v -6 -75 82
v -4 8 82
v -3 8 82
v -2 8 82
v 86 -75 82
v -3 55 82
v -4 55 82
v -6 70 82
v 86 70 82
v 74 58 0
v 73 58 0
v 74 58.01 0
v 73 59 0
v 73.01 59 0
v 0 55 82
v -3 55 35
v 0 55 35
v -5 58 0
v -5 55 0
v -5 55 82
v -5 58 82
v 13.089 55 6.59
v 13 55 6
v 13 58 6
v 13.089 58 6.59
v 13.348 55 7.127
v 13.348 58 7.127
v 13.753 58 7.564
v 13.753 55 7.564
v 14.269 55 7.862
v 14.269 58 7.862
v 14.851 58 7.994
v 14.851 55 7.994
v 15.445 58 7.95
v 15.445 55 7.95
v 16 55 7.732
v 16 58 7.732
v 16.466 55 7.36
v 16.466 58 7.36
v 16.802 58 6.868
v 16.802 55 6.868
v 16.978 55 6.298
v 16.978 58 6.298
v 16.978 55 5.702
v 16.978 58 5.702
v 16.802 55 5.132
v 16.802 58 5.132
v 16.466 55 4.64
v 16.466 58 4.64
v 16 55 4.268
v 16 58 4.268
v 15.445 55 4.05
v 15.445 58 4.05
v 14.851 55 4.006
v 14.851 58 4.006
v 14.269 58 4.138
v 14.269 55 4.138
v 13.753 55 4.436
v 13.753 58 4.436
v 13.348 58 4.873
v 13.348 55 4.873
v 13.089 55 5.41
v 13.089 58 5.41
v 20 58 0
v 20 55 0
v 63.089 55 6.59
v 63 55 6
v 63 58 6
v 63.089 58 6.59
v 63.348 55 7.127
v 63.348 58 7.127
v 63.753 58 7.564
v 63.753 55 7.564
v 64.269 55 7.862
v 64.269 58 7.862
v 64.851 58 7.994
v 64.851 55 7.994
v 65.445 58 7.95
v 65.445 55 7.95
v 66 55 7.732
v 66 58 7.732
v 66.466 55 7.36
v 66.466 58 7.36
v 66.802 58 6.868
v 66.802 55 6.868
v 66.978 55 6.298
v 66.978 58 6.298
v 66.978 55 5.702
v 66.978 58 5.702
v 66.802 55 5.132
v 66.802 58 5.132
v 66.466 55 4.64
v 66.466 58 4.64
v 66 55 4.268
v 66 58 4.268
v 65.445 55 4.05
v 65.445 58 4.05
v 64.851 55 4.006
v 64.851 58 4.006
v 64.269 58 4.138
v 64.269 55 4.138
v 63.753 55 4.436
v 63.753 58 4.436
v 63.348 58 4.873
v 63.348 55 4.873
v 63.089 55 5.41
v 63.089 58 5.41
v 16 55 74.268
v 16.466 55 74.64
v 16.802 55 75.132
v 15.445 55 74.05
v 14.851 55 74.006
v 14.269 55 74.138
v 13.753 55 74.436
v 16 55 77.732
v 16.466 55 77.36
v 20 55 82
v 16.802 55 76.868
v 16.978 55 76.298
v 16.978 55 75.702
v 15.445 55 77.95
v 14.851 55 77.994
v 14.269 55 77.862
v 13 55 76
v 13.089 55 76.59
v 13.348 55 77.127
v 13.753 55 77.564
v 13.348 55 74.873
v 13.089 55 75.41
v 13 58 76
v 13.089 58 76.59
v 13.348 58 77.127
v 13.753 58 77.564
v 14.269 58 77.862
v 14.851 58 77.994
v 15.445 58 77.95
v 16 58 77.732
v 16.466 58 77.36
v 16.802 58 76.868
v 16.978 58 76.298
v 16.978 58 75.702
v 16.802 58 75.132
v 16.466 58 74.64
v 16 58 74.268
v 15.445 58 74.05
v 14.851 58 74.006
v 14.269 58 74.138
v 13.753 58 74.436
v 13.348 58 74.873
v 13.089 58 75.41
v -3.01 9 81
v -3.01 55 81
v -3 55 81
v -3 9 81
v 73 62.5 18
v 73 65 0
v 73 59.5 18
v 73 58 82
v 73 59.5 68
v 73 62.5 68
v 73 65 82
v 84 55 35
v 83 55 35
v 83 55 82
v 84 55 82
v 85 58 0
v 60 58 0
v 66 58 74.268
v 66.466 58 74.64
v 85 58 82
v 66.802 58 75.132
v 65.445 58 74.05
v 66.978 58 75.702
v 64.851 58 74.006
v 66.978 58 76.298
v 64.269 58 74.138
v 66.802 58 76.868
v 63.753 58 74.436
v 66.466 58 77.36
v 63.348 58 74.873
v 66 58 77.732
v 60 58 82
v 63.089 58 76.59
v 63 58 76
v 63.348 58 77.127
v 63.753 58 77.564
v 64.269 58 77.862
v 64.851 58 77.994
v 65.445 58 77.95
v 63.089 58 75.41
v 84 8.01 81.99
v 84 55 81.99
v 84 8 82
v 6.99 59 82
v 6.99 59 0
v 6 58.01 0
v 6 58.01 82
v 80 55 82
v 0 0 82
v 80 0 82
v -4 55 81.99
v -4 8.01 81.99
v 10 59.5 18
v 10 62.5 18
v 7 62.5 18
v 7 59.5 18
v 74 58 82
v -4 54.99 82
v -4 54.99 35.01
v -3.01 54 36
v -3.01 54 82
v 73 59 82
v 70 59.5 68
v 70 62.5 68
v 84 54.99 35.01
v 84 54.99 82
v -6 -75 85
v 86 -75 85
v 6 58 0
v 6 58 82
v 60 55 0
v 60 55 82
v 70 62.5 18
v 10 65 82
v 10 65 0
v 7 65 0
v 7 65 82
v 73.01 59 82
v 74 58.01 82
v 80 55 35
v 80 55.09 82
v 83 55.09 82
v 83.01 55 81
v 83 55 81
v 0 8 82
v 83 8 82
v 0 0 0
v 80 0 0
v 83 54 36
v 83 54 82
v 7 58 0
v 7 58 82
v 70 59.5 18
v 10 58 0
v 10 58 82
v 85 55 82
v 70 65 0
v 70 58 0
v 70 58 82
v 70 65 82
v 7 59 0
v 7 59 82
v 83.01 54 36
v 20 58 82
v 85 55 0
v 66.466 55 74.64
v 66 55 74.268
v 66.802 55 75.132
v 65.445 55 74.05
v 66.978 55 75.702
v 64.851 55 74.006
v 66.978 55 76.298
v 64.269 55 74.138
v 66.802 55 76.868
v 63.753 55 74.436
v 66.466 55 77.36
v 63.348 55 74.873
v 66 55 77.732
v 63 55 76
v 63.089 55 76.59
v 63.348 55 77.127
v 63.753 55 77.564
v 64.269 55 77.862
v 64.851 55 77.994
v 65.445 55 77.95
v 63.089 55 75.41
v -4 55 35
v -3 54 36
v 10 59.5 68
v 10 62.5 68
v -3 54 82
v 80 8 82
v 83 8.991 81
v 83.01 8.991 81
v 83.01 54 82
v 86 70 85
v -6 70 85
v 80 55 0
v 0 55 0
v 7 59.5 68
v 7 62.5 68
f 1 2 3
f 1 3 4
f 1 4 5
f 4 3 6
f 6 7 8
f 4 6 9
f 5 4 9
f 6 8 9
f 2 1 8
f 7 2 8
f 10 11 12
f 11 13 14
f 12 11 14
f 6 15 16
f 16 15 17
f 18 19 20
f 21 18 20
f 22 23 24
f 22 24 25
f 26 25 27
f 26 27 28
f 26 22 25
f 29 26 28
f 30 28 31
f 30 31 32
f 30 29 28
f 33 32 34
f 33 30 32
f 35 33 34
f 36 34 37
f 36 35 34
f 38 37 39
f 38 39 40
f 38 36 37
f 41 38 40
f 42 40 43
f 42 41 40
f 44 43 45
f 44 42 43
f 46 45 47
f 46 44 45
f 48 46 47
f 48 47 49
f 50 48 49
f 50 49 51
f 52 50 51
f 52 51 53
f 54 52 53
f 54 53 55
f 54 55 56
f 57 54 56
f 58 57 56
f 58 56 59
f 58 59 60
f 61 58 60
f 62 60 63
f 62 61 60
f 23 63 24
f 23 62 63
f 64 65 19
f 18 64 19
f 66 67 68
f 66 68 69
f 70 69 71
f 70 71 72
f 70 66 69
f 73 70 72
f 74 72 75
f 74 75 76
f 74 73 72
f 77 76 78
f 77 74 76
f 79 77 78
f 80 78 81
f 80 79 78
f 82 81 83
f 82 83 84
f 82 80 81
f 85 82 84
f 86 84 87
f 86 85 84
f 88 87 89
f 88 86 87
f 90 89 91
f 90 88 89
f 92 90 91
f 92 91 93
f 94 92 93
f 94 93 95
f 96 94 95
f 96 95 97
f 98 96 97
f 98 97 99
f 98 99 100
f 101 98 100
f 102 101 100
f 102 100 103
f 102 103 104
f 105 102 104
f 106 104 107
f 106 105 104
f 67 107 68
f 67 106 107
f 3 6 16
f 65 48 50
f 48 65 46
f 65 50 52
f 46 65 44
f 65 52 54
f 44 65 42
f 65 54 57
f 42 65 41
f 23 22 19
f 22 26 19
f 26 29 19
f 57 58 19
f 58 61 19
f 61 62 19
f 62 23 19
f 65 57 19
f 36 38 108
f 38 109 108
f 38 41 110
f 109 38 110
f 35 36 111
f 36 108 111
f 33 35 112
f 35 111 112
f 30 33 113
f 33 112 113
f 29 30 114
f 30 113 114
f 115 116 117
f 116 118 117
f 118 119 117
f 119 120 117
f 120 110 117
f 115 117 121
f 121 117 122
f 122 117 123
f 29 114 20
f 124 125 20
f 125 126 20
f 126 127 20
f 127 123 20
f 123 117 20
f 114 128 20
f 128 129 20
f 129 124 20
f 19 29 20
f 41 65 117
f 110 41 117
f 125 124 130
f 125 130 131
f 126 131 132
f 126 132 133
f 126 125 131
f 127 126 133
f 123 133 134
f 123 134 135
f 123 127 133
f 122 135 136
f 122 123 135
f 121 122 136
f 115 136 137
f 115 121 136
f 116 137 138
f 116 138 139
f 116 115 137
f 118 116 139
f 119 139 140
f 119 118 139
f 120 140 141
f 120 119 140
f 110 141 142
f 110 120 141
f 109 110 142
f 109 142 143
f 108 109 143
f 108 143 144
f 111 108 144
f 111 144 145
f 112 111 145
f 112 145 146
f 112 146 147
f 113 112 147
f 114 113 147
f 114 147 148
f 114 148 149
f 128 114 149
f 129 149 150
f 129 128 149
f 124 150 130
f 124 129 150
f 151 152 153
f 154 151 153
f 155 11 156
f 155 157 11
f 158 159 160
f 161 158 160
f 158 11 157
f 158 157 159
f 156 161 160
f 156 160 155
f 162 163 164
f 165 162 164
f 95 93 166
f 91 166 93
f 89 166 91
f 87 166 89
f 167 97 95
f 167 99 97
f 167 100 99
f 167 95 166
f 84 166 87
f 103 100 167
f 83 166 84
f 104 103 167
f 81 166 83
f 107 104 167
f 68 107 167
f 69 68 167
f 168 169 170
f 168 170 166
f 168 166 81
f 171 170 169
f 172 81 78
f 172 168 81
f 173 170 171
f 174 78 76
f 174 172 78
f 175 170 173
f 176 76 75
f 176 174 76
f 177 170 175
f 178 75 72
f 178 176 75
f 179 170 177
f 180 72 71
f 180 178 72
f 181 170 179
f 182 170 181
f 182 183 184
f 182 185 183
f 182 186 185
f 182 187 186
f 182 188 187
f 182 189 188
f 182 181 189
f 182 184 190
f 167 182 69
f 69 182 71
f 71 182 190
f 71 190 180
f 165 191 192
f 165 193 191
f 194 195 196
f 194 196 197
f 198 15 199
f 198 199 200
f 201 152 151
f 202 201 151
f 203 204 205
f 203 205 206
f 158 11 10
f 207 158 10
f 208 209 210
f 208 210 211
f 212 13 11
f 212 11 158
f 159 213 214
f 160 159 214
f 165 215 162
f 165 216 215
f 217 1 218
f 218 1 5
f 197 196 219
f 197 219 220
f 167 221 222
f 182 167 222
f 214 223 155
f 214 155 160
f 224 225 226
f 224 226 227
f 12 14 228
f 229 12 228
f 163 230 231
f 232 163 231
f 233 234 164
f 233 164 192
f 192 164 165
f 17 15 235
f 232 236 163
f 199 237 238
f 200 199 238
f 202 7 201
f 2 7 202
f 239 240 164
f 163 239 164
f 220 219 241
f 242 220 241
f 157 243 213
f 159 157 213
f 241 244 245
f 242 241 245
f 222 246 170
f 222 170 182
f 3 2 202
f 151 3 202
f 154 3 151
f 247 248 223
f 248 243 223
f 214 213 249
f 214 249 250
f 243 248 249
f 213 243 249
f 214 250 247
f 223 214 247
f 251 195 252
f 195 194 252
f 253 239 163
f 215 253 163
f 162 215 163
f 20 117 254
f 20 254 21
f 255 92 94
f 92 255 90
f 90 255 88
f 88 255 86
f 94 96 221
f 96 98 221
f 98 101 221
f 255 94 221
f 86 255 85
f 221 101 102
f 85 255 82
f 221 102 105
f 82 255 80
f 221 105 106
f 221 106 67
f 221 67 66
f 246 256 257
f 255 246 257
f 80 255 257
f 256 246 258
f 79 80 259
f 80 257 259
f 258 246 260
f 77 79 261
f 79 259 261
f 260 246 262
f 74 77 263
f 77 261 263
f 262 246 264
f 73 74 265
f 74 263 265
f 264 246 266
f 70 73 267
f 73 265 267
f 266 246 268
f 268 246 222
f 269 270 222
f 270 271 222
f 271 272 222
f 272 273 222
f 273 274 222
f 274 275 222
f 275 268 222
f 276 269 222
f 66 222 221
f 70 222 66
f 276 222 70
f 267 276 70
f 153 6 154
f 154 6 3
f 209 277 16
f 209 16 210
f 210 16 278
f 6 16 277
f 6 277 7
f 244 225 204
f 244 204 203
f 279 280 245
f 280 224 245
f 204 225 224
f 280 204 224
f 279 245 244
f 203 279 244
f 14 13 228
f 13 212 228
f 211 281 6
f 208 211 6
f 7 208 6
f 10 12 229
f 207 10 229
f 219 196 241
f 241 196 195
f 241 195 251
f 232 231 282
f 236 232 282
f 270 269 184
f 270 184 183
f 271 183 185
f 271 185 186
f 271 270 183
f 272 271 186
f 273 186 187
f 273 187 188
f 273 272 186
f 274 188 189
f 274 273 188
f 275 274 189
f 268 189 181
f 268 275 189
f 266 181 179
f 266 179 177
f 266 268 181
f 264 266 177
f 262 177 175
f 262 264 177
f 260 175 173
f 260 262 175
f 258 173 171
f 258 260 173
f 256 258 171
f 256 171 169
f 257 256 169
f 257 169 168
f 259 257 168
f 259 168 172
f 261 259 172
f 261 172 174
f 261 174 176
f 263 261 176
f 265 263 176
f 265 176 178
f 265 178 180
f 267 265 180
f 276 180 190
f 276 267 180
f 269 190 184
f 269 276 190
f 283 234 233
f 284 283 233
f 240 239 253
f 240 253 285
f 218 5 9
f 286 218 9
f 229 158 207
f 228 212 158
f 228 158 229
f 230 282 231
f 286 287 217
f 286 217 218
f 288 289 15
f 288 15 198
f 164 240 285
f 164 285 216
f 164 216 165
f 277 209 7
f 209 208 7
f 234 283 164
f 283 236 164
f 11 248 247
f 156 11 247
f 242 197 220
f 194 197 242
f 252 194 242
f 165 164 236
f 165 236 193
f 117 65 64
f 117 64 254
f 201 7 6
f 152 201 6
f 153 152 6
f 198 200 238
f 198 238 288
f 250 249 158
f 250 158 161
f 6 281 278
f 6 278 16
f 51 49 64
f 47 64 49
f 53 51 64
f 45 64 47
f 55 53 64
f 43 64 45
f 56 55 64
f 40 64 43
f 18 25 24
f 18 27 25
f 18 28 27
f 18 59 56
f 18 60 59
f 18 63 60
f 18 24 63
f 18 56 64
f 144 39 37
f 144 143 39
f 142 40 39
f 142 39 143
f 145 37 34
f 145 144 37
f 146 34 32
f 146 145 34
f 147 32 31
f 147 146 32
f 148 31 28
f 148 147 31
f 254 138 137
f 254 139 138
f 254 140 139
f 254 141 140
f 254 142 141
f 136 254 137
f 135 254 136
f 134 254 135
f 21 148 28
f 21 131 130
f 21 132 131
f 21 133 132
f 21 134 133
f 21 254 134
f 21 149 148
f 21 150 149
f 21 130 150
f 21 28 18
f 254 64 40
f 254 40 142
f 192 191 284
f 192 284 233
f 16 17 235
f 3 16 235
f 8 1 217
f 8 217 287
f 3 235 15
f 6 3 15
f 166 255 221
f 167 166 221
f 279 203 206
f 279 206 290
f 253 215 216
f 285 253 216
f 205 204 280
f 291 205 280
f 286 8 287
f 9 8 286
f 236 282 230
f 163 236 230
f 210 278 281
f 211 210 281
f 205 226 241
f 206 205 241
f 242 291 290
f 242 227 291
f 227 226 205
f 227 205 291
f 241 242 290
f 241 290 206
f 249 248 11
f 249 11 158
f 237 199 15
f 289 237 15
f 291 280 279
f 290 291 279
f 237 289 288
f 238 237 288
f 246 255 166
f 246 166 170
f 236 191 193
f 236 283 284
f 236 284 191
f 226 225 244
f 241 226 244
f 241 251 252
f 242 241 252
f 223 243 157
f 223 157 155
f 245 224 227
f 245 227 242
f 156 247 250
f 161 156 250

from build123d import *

# Parameters (mm, degrees)
SKETCH001_W     = 25
SKETCH001_H     = 82
SKETCH001_R     = 2
PAD_DEPTH       = 3
SKETCH003_W     = 7
SKETCH003_H     = 82
SKETCH003_W_2   = 3
SKETCH003_H_2   = 50
PAD006_DEPTH    = 3
SKETCH004_W     = 7
SKETCH004_H     = 82
SKETCH004_W_2   = 3
SKETCH004_H_2   = 50
PAD008_DEPTH    = 3
PAD009_DEPTH    = 3
PAD010_DEPTH    = 3
BOX_W           = 80
BOX_H           = 55
BOX_DEPTH       = 82
SKETCH006_W     = 1
SKETCH006_H     = 82
PAD011_DEPTH    = 1
CHAMFER_SIZE    = 0.99
CHAMFER001_SIZE = 0.99
PAD018_DEPTH    = 2
SKETCH007_W     = 1
SKETCH007_H     = 47
PAD012_DEPTH    = 1
CHAMFER003_SIZE = 0.99
PAD019_DEPTH    = 2
SKETCH008_W     = 1
SKETCH008_H     = 47
PAD013_DEPTH    = 1
CHAMFER002_SIZE = 0.99
PAD016_DEPTH    = 2
SKETCH002_W     = 92
SKETCH002_H     = 145
PAD007_DEPTH    = 3
SKETCH009_W     = 1
SKETCH009_H     = 47
PAD014_DEPTH    = 1
CHAMFER004_SIZE = 0.99
PAD017_DEPTH    = 2
SKETCH010_W     = 1
SKETCH010_H     = 47
PAD015_DEPTH    = 1
CHAMFER005_SIZE = 0.99


with BuildPart() as pad:
    # Sketch001 → Pad (new body)
    with BuildSketch(Plane(origin=(0, 55, 0), x_dir=(-1, 0, 0), z_dir=(0, 1, 0))):
        with Locations((-7.5, 41)):
            Rectangle(SKETCH001_W, SKETCH001_H)
        with Locations((-15, 76)):
            Circle(SKETCH001_R, mode=Mode.SUBTRACT)
        with Locations((-15, 6)):
            Circle(SKETCH001_R, mode=Mode.SUBTRACT)
        with Locations((-72.5, 41)):
            Rectangle(SKETCH001_W, SKETCH001_H)
        with Locations((-65.000015, 76)):
            Circle(SKETCH001_R, mode=Mode.SUBTRACT)
        with Locations((-65, 6)):
            Circle(SKETCH001_R, mode=Mode.SUBTRACT)
    extrude(amount=PAD_DEPTH)


with BuildPart() as pad006:
    # Sketch003 → Pad006 (new body)
    with BuildSketch(Plane(origin=(10, 0, 0), x_dir=(0, -1, 0), z_dir=(-1, 0, 0))):
        with Locations((-61.5, 41)):
            Rectangle(SKETCH003_W, SKETCH003_H)
        with Locations((-61, 43)):
            Rectangle(SKETCH003_W_2, SKETCH003_H_2, mode=Mode.SUBTRACT)
    extrude(amount=PAD006_DEPTH)


with BuildPart() as pad008:
    # Sketch004 → Pad008 (new body)
    with BuildSketch(Plane.YZ.offset(70)):
        with Locations((61.5, 41)):
            Rectangle(SKETCH004_W, SKETCH004_H)
        with Locations((61, 43)):
            Rectangle(SKETCH004_W_2, SKETCH004_H_2, mode=Mode.SUBTRACT)
    extrude(amount=PAD008_DEPTH)


with BuildPart() as pad009:
    # Sketch005 → Pad009 (new body)
    with BuildSketch(Plane.YZ.offset(80)):
        Polygon((8, 82), (55, 35), (55.09, 82), align=None)
    extrude(amount=PAD009_DEPTH)


with BuildPart() as pad010:
    # Sketch → Pad010 (new body)
    with BuildSketch(Plane(origin=(0, 0, 0), x_dir=(0, -1, 0), z_dir=(-1, 0, 0))):
        Polygon((-55, 82), (-55, 35), (-8, 82), align=None)
    extrude(amount=PAD010_DEPTH)


with BuildPart() as cube:
    # Box → Box (new body)
    with BuildSketch(Plane.XY):
        with Locations((40, 27.5)):
            Rectangle(BOX_W, BOX_H)
    extrude(amount=BOX_DEPTH)


with BuildPart() as chamfer001:
    # Sketch006 → Pad011 (new body)
    with BuildSketch(Plane.XZ.offset(-59)):
        with Locations((6.5, 41)):
            Rectangle(SKETCH006_W, SKETCH006_H)
        with Locations((73.5, 41)):
            Rectangle(SKETCH006_W, SKETCH006_H)
    extrude(amount=PAD011_DEPTH)

    # Chamfer
    chamfer_edges = [chamfer001.edges().sort_by_distance(p)[0] for p in [
        (74, 59, 41),
    ]]
    chamfer(chamfer_edges, length=CHAMFER_SIZE)

    # Chamfer001
    chamfer001_edges = [chamfer001.edges().sort_by_distance(p)[0] for p in [
        (6, 59, 41),
    ]]
    chamfer(chamfer001_edges, length=CHAMFER001_SIZE)


with BuildPart() as pad018:
    # Sketch013 → Pad018 (new body)
    with BuildSketch(Plane.YZ.offset(-3)):
        Polygon((54, 36), (54, 35), (55, 35), align=None)
    extrude(amount=-PAD018_DEPTH)


with BuildPart() as cut002:
    # Sketch007 → Pad012 (new body)
    with BuildSketch(Plane.YZ.offset(-3)):
        with Locations((54.5, 58.5)):
            Rectangle(SKETCH007_W, SKETCH007_H)
    extrude(amount=-PAD012_DEPTH)

    # Chamfer003
    chamfer003_edges = [cut002.edges().sort_by_distance(p)[0] for p in [
        (-4, 54, 58.5),
    ]]
    chamfer(chamfer003_edges, length=CHAMFER003_SIZE)

    # Cut002: cut Pad018
    add(pad018.part, mode=Mode.SUBTRACT)


with BuildPart() as pad019:
    # Sketch014 → Pad019 (new body)
    with BuildSketch(Plane(origin=(83, 0, 0), x_dir=(0, -1, 0), z_dir=(-1, 0, 0))):
        Polygon((-55, 35), (-54, 35), (-54, 36), align=None)
    extrude(amount=-PAD019_DEPTH)


with BuildPart() as cut003:
    # Sketch008 → Pad013 (new body)
    with BuildSketch(Plane.YZ.offset(83)):
        with Locations((54.5, 58.5)):
            Rectangle(SKETCH008_W, SKETCH008_H)
    extrude(amount=PAD013_DEPTH)

    # Chamfer002
    chamfer002_edges = [cut003.edges().sort_by_distance(p)[0] for p in [
        (84, 54, 58.5),
    ]]
    chamfer(chamfer002_edges, length=CHAMFER002_SIZE)

    # Cut003: cut Pad019
    add(pad019.part, mode=Mode.SUBTRACT)


with BuildPart() as pad016:
    # Sketch011 → Pad016 (new body)
    with BuildSketch(Plane.YZ.offset(-2)):
        Polygon((8, 82), (9, 81), (8, 81), align=None)
    extrude(amount=-PAD016_DEPTH)


with BuildPart() as chamfer004:
    # Sketch002 → Pad007 (new body)
    with BuildSketch(Plane.XY.offset(82)):
        with Locations((40, -2.5)):
            Rectangle(SKETCH002_W, SKETCH002_H)
    extrude(amount=PAD007_DEPTH)

    # Sketch009 → Pad014 (new body)
    with BuildSketch(Plane(origin=(0, 0, 82), x_dir=(1, 0, 0), z_dir=(0, 0, -1))):
        with Locations((-3.5, -31.5)):
            Rectangle(SKETCH009_W, SKETCH009_H)
    extrude(amount=PAD014_DEPTH)

    # Cut: cut Pad016
    add(pad016.part, mode=Mode.SUBTRACT)

    # Chamfer004
    chamfer004_edges = [chamfer004.edges().sort_by_distance(p)[0] for p in [
        (-4, 32, 81),
    ]]
    chamfer(chamfer004_edges, length=CHAMFER004_SIZE)


with BuildPart() as pad017:
    # Sketch012 → Pad017 (new body)
    with BuildSketch(Plane.YZ.offset(83)):
        Polygon((8, 81), (8.99996, 80.991035), (8, 82), align=None)
    extrude(amount=PAD017_DEPTH)


with BuildPart() as chamfer005:
    # Sketch010 → Pad015 (new body)
    with BuildSketch(Plane.XY.offset(82)):
        with Locations((83.5, 31.5)):
            Rectangle(SKETCH010_W, SKETCH010_H)
    extrude(amount=-PAD015_DEPTH)

    # Cut001: cut Pad017
    add(pad017.part, mode=Mode.SUBTRACT)

    # Chamfer005
    chamfer005_edges = [chamfer005.edges().sort_by_distance(p)[0] for p in [
        (84, 31.995537, 81),
    ]]
    chamfer(chamfer005_edges, length=CHAMFER005_SIZE)


solid = Compound([pad.part, pad006.part, pad008.part, pad009.part, pad010.part, cube.part, chamfer001.part, cut002.part, cut003.part, chamfer004.part, chamfer005.part])
